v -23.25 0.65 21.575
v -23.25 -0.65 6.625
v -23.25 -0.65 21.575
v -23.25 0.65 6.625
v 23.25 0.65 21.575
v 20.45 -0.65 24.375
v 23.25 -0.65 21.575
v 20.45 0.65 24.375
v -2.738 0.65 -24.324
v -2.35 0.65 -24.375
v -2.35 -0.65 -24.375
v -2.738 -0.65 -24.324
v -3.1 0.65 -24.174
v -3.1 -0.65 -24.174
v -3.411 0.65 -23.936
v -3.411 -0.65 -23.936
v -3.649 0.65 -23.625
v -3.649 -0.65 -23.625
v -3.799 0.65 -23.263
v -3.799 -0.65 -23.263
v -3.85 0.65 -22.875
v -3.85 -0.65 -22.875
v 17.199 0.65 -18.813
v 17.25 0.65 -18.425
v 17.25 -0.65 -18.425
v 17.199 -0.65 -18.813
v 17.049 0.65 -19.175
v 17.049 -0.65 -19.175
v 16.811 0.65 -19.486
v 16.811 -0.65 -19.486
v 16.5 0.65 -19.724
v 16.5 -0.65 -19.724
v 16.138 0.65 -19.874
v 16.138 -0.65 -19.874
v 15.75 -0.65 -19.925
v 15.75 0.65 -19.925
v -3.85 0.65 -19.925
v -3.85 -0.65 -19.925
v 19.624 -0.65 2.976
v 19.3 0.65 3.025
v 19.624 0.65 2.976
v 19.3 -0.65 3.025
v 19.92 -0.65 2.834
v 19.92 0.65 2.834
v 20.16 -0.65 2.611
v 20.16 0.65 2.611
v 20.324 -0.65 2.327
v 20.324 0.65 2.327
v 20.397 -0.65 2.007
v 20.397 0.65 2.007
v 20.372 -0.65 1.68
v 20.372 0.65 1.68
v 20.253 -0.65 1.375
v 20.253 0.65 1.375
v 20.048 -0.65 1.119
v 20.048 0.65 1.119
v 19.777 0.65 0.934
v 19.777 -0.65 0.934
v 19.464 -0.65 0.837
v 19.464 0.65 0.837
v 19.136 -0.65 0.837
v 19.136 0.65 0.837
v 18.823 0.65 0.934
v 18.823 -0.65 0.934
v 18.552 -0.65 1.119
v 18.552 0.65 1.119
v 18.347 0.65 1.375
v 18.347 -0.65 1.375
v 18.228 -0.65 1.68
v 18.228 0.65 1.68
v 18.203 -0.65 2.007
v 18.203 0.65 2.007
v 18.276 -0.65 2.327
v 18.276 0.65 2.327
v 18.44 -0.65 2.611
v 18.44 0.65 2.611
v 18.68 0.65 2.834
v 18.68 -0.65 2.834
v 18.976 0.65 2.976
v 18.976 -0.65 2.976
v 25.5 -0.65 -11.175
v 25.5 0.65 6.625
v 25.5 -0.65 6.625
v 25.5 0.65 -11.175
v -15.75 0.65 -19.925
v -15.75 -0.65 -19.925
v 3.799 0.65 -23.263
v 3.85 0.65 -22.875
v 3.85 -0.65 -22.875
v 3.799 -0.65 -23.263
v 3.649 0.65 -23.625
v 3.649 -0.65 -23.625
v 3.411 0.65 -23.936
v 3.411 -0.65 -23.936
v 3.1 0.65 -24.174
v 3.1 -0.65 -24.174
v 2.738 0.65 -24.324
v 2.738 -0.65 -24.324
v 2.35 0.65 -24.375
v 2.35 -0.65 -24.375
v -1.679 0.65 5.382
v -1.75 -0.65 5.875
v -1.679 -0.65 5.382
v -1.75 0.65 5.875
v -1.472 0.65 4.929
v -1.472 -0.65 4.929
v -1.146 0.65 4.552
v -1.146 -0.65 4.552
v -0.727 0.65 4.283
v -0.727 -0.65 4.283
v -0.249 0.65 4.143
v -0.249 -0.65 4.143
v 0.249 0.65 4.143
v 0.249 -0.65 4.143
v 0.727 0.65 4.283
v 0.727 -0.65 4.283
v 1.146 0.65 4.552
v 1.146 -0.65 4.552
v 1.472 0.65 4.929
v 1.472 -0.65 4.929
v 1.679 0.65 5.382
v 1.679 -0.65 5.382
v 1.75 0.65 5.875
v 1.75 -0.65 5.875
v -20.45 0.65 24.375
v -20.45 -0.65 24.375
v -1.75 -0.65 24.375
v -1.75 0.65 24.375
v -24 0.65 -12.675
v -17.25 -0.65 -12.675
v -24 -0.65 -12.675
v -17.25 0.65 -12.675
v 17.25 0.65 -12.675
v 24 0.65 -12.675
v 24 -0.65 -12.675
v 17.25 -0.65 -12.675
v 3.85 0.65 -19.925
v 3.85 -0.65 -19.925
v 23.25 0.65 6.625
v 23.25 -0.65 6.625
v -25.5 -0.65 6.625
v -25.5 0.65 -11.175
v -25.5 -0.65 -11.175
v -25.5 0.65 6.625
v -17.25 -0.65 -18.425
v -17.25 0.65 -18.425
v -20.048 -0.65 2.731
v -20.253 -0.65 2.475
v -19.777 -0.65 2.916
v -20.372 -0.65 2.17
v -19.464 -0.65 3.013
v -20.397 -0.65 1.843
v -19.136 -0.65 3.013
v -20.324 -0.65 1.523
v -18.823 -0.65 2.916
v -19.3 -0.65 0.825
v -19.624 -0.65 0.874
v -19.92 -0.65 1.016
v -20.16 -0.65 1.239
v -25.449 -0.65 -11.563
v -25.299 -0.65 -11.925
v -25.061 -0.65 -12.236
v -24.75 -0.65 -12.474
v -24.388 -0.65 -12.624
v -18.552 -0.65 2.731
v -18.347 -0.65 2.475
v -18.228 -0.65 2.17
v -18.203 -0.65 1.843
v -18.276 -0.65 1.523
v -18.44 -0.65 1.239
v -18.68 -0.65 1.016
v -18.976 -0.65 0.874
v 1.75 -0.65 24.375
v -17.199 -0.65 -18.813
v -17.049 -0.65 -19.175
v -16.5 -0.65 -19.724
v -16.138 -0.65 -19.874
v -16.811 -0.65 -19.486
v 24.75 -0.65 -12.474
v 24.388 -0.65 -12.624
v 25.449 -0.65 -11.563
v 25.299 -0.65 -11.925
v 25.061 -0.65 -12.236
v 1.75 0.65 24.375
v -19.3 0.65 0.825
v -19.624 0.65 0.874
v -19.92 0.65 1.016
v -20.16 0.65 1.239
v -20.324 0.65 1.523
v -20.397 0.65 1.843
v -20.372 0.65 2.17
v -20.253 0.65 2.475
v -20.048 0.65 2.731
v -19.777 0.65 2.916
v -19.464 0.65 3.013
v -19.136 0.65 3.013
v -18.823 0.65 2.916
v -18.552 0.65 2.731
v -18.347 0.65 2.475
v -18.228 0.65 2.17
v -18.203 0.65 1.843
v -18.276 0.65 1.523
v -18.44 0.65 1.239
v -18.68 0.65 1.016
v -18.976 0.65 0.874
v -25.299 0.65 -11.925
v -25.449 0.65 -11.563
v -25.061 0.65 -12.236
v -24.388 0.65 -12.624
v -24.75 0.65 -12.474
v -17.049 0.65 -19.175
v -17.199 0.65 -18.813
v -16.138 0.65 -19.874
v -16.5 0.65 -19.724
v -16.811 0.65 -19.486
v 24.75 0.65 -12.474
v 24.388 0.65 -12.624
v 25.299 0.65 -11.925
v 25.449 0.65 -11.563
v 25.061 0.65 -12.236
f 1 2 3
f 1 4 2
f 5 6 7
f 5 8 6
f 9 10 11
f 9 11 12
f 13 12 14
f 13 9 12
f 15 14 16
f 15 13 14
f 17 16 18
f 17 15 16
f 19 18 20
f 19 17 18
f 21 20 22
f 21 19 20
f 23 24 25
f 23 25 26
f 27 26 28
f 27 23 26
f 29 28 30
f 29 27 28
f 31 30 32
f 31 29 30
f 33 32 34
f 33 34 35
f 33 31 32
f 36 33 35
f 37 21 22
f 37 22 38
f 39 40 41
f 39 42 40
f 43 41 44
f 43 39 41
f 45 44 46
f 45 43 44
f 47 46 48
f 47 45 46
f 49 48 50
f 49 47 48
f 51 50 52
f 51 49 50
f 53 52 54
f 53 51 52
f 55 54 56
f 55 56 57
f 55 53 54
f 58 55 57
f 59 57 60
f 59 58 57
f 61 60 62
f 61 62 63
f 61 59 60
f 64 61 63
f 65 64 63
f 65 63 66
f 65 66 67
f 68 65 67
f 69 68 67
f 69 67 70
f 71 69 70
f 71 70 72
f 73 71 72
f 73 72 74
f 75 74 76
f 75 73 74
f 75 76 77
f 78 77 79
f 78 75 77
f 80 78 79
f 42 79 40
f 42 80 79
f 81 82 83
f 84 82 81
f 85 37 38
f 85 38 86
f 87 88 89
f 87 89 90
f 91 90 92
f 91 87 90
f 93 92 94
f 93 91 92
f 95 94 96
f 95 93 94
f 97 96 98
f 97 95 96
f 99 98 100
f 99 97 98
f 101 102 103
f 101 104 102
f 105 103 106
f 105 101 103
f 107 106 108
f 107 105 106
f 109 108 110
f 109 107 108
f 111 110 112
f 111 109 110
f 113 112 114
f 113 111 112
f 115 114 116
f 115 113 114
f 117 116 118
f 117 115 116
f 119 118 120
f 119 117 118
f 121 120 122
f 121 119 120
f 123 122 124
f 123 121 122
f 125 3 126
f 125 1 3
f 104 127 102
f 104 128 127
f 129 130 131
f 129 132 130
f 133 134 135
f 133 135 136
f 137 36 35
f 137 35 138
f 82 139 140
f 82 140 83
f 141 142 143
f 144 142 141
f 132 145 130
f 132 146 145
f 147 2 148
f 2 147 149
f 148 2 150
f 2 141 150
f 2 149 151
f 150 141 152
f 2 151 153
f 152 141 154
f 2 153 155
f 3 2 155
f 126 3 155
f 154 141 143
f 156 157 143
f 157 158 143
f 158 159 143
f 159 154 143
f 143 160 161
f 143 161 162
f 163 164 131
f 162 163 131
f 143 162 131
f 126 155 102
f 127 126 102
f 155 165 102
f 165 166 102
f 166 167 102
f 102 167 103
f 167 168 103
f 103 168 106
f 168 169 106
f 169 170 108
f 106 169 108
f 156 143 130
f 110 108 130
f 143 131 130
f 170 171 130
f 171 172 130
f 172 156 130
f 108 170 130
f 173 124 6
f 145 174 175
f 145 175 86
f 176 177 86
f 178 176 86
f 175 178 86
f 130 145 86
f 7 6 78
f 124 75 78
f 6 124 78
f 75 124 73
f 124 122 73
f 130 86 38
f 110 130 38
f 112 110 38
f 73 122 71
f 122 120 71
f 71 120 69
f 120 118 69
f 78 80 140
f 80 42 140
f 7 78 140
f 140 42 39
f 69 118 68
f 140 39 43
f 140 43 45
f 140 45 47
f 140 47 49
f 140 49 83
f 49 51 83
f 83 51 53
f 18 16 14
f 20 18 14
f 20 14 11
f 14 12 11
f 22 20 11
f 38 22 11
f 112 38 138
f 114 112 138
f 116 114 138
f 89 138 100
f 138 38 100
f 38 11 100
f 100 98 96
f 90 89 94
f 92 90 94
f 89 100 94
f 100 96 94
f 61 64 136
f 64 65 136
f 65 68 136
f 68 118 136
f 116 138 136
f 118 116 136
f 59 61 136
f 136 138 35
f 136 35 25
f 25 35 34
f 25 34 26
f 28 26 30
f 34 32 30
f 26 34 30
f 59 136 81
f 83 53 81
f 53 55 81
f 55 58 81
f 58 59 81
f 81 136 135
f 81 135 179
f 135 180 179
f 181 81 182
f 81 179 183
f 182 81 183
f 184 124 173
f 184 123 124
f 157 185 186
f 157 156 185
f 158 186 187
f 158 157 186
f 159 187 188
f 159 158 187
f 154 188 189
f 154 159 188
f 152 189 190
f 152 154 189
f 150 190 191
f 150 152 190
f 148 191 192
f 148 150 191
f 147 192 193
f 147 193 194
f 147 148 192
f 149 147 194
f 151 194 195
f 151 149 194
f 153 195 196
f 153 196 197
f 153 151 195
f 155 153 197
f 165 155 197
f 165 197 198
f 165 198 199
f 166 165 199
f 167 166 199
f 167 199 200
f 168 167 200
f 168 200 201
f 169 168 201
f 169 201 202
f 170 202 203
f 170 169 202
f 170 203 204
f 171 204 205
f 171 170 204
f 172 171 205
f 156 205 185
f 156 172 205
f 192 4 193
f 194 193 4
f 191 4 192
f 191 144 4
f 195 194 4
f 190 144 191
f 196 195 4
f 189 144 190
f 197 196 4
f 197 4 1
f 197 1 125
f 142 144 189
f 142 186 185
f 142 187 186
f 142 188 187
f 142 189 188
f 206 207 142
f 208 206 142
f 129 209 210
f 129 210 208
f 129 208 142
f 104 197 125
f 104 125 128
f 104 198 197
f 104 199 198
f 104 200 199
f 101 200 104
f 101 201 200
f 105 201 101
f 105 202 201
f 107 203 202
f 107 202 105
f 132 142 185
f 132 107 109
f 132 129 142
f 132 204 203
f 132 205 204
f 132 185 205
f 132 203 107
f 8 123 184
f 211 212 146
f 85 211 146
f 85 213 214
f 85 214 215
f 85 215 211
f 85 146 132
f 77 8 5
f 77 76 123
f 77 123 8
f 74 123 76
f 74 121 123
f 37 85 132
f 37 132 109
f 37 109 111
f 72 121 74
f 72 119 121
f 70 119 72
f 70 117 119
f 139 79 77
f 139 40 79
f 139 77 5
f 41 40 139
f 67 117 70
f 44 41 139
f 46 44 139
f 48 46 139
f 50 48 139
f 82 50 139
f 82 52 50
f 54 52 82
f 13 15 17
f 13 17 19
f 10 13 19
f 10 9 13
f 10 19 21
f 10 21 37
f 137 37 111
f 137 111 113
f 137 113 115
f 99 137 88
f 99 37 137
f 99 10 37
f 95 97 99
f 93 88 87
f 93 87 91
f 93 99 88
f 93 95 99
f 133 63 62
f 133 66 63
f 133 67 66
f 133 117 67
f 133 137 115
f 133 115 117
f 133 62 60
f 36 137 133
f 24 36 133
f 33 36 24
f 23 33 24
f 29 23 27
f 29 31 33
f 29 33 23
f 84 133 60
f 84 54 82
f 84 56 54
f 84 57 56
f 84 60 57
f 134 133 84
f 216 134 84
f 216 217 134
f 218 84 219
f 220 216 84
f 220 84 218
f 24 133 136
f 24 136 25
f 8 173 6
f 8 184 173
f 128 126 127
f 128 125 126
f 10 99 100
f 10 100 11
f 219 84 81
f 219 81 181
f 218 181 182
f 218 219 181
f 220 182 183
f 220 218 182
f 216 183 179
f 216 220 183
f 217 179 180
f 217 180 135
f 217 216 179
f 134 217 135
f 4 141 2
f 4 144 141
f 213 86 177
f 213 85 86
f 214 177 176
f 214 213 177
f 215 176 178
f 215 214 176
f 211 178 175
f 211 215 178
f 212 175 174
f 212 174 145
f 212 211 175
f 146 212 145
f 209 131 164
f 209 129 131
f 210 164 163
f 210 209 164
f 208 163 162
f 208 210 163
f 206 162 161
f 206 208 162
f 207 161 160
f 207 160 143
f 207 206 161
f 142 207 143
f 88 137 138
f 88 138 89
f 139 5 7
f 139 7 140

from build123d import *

# Parameters (mm, degrees)
SKETCH1_R           = 1.1
BOSS_EXTRUDE1_DEPTH = 0.65


with BuildPart() as part:
    # Sketch1 → Boss-Extrude1 (new, symmetric)
    with BuildSketch(Plane(origin=(0, 0, 0), x_dir=(1, 0, 0), z_dir=(0, 1, 0))):
        with BuildLine():
            Line((20.45, -24.375), (23.25, -21.575))
            Line((23.25, -21.575), (23.25, -8.875))
            Line((23.25, -8.875), (23.25, -6.625))
            Line((23.25, -6.625), (25.5, -6.625))
            Line((25.5, -6.625), (25.5, 11.175))
            ThreePointArc((25.5, 11.175), (25.060660172, 12.235660172), (24, 12.675))
            Line((24, 12.675), (17.25, 12.675))
            Line((17.25, 12.675), (17.25, 18.425))
            ThreePointArc((17.25, 18.425), (16.810660172, 19.485660172), (15.75, 19.925))
            Line((15.75, 19.925), (3.85, 19.925))
            Line((3.85, 19.925), (3.85, 22.875))
            ThreePointArc((3.85, 22.875), (3.410660172, 23.935660172), (2.35, 24.375))
            Line((2.35, 24.375), (-2.35, 24.375))
            ThreePointArc((-2.35, 24.375), (-3.410660172, 23.935660172), (-3.85, 22.875))
            Line((-3.85, 22.875), (-3.85, 19.925))
            Line((-3.85, 19.925), (-15.75, 19.925))
            ThreePointArc((-15.75, 19.925), (-16.810660172, 19.485660172), (-17.25, 18.425))
            Line((-17.25, 18.425), (-17.25, 12.675))
            Line((-17.25, 12.675), (-24, 12.675))
            ThreePointArc((-24, 12.675), (-25.060660172, 12.235660172), (-25.5, 11.175))
            Line((-25.5, 11.175), (-25.5, -6.625))
            Line((-25.5, -6.625), (-23.25, -6.625))
            Line((-23.25, -6.625), (-23.25, -8.875))
            Line((-23.25, -8.875), (-23.25, -21.575))
            Line((-23.25, -21.575), (-20.45, -24.375))
            Line((-20.45, -24.375), (-1.75, -24.375))
            Line((-1.75, -24.375), (-1.75, -5.875))
            ThreePointArc((-1.75, -5.875), (0, -4.125), (1.75, -5.875))
            Line((1.75, -5.875), (1.75, -24.375))
            Line((1.75, -24.375), (20.45, -24.375))
        make_face()
        with Locations(Location((19.3, -1.925, 0), (0, 0, 270))):
            Circle(SKETCH1_R, mode=Mode.SUBTRACT)
        with Locations(Location((-19.3, -1.925, 0), (0, 0, 90))):
            Circle(SKETCH1_R, mode=Mode.SUBTRACT)
    extrude(amount=BOSS_EXTRUDE1_DEPTH, both=True)


solid = part.part
